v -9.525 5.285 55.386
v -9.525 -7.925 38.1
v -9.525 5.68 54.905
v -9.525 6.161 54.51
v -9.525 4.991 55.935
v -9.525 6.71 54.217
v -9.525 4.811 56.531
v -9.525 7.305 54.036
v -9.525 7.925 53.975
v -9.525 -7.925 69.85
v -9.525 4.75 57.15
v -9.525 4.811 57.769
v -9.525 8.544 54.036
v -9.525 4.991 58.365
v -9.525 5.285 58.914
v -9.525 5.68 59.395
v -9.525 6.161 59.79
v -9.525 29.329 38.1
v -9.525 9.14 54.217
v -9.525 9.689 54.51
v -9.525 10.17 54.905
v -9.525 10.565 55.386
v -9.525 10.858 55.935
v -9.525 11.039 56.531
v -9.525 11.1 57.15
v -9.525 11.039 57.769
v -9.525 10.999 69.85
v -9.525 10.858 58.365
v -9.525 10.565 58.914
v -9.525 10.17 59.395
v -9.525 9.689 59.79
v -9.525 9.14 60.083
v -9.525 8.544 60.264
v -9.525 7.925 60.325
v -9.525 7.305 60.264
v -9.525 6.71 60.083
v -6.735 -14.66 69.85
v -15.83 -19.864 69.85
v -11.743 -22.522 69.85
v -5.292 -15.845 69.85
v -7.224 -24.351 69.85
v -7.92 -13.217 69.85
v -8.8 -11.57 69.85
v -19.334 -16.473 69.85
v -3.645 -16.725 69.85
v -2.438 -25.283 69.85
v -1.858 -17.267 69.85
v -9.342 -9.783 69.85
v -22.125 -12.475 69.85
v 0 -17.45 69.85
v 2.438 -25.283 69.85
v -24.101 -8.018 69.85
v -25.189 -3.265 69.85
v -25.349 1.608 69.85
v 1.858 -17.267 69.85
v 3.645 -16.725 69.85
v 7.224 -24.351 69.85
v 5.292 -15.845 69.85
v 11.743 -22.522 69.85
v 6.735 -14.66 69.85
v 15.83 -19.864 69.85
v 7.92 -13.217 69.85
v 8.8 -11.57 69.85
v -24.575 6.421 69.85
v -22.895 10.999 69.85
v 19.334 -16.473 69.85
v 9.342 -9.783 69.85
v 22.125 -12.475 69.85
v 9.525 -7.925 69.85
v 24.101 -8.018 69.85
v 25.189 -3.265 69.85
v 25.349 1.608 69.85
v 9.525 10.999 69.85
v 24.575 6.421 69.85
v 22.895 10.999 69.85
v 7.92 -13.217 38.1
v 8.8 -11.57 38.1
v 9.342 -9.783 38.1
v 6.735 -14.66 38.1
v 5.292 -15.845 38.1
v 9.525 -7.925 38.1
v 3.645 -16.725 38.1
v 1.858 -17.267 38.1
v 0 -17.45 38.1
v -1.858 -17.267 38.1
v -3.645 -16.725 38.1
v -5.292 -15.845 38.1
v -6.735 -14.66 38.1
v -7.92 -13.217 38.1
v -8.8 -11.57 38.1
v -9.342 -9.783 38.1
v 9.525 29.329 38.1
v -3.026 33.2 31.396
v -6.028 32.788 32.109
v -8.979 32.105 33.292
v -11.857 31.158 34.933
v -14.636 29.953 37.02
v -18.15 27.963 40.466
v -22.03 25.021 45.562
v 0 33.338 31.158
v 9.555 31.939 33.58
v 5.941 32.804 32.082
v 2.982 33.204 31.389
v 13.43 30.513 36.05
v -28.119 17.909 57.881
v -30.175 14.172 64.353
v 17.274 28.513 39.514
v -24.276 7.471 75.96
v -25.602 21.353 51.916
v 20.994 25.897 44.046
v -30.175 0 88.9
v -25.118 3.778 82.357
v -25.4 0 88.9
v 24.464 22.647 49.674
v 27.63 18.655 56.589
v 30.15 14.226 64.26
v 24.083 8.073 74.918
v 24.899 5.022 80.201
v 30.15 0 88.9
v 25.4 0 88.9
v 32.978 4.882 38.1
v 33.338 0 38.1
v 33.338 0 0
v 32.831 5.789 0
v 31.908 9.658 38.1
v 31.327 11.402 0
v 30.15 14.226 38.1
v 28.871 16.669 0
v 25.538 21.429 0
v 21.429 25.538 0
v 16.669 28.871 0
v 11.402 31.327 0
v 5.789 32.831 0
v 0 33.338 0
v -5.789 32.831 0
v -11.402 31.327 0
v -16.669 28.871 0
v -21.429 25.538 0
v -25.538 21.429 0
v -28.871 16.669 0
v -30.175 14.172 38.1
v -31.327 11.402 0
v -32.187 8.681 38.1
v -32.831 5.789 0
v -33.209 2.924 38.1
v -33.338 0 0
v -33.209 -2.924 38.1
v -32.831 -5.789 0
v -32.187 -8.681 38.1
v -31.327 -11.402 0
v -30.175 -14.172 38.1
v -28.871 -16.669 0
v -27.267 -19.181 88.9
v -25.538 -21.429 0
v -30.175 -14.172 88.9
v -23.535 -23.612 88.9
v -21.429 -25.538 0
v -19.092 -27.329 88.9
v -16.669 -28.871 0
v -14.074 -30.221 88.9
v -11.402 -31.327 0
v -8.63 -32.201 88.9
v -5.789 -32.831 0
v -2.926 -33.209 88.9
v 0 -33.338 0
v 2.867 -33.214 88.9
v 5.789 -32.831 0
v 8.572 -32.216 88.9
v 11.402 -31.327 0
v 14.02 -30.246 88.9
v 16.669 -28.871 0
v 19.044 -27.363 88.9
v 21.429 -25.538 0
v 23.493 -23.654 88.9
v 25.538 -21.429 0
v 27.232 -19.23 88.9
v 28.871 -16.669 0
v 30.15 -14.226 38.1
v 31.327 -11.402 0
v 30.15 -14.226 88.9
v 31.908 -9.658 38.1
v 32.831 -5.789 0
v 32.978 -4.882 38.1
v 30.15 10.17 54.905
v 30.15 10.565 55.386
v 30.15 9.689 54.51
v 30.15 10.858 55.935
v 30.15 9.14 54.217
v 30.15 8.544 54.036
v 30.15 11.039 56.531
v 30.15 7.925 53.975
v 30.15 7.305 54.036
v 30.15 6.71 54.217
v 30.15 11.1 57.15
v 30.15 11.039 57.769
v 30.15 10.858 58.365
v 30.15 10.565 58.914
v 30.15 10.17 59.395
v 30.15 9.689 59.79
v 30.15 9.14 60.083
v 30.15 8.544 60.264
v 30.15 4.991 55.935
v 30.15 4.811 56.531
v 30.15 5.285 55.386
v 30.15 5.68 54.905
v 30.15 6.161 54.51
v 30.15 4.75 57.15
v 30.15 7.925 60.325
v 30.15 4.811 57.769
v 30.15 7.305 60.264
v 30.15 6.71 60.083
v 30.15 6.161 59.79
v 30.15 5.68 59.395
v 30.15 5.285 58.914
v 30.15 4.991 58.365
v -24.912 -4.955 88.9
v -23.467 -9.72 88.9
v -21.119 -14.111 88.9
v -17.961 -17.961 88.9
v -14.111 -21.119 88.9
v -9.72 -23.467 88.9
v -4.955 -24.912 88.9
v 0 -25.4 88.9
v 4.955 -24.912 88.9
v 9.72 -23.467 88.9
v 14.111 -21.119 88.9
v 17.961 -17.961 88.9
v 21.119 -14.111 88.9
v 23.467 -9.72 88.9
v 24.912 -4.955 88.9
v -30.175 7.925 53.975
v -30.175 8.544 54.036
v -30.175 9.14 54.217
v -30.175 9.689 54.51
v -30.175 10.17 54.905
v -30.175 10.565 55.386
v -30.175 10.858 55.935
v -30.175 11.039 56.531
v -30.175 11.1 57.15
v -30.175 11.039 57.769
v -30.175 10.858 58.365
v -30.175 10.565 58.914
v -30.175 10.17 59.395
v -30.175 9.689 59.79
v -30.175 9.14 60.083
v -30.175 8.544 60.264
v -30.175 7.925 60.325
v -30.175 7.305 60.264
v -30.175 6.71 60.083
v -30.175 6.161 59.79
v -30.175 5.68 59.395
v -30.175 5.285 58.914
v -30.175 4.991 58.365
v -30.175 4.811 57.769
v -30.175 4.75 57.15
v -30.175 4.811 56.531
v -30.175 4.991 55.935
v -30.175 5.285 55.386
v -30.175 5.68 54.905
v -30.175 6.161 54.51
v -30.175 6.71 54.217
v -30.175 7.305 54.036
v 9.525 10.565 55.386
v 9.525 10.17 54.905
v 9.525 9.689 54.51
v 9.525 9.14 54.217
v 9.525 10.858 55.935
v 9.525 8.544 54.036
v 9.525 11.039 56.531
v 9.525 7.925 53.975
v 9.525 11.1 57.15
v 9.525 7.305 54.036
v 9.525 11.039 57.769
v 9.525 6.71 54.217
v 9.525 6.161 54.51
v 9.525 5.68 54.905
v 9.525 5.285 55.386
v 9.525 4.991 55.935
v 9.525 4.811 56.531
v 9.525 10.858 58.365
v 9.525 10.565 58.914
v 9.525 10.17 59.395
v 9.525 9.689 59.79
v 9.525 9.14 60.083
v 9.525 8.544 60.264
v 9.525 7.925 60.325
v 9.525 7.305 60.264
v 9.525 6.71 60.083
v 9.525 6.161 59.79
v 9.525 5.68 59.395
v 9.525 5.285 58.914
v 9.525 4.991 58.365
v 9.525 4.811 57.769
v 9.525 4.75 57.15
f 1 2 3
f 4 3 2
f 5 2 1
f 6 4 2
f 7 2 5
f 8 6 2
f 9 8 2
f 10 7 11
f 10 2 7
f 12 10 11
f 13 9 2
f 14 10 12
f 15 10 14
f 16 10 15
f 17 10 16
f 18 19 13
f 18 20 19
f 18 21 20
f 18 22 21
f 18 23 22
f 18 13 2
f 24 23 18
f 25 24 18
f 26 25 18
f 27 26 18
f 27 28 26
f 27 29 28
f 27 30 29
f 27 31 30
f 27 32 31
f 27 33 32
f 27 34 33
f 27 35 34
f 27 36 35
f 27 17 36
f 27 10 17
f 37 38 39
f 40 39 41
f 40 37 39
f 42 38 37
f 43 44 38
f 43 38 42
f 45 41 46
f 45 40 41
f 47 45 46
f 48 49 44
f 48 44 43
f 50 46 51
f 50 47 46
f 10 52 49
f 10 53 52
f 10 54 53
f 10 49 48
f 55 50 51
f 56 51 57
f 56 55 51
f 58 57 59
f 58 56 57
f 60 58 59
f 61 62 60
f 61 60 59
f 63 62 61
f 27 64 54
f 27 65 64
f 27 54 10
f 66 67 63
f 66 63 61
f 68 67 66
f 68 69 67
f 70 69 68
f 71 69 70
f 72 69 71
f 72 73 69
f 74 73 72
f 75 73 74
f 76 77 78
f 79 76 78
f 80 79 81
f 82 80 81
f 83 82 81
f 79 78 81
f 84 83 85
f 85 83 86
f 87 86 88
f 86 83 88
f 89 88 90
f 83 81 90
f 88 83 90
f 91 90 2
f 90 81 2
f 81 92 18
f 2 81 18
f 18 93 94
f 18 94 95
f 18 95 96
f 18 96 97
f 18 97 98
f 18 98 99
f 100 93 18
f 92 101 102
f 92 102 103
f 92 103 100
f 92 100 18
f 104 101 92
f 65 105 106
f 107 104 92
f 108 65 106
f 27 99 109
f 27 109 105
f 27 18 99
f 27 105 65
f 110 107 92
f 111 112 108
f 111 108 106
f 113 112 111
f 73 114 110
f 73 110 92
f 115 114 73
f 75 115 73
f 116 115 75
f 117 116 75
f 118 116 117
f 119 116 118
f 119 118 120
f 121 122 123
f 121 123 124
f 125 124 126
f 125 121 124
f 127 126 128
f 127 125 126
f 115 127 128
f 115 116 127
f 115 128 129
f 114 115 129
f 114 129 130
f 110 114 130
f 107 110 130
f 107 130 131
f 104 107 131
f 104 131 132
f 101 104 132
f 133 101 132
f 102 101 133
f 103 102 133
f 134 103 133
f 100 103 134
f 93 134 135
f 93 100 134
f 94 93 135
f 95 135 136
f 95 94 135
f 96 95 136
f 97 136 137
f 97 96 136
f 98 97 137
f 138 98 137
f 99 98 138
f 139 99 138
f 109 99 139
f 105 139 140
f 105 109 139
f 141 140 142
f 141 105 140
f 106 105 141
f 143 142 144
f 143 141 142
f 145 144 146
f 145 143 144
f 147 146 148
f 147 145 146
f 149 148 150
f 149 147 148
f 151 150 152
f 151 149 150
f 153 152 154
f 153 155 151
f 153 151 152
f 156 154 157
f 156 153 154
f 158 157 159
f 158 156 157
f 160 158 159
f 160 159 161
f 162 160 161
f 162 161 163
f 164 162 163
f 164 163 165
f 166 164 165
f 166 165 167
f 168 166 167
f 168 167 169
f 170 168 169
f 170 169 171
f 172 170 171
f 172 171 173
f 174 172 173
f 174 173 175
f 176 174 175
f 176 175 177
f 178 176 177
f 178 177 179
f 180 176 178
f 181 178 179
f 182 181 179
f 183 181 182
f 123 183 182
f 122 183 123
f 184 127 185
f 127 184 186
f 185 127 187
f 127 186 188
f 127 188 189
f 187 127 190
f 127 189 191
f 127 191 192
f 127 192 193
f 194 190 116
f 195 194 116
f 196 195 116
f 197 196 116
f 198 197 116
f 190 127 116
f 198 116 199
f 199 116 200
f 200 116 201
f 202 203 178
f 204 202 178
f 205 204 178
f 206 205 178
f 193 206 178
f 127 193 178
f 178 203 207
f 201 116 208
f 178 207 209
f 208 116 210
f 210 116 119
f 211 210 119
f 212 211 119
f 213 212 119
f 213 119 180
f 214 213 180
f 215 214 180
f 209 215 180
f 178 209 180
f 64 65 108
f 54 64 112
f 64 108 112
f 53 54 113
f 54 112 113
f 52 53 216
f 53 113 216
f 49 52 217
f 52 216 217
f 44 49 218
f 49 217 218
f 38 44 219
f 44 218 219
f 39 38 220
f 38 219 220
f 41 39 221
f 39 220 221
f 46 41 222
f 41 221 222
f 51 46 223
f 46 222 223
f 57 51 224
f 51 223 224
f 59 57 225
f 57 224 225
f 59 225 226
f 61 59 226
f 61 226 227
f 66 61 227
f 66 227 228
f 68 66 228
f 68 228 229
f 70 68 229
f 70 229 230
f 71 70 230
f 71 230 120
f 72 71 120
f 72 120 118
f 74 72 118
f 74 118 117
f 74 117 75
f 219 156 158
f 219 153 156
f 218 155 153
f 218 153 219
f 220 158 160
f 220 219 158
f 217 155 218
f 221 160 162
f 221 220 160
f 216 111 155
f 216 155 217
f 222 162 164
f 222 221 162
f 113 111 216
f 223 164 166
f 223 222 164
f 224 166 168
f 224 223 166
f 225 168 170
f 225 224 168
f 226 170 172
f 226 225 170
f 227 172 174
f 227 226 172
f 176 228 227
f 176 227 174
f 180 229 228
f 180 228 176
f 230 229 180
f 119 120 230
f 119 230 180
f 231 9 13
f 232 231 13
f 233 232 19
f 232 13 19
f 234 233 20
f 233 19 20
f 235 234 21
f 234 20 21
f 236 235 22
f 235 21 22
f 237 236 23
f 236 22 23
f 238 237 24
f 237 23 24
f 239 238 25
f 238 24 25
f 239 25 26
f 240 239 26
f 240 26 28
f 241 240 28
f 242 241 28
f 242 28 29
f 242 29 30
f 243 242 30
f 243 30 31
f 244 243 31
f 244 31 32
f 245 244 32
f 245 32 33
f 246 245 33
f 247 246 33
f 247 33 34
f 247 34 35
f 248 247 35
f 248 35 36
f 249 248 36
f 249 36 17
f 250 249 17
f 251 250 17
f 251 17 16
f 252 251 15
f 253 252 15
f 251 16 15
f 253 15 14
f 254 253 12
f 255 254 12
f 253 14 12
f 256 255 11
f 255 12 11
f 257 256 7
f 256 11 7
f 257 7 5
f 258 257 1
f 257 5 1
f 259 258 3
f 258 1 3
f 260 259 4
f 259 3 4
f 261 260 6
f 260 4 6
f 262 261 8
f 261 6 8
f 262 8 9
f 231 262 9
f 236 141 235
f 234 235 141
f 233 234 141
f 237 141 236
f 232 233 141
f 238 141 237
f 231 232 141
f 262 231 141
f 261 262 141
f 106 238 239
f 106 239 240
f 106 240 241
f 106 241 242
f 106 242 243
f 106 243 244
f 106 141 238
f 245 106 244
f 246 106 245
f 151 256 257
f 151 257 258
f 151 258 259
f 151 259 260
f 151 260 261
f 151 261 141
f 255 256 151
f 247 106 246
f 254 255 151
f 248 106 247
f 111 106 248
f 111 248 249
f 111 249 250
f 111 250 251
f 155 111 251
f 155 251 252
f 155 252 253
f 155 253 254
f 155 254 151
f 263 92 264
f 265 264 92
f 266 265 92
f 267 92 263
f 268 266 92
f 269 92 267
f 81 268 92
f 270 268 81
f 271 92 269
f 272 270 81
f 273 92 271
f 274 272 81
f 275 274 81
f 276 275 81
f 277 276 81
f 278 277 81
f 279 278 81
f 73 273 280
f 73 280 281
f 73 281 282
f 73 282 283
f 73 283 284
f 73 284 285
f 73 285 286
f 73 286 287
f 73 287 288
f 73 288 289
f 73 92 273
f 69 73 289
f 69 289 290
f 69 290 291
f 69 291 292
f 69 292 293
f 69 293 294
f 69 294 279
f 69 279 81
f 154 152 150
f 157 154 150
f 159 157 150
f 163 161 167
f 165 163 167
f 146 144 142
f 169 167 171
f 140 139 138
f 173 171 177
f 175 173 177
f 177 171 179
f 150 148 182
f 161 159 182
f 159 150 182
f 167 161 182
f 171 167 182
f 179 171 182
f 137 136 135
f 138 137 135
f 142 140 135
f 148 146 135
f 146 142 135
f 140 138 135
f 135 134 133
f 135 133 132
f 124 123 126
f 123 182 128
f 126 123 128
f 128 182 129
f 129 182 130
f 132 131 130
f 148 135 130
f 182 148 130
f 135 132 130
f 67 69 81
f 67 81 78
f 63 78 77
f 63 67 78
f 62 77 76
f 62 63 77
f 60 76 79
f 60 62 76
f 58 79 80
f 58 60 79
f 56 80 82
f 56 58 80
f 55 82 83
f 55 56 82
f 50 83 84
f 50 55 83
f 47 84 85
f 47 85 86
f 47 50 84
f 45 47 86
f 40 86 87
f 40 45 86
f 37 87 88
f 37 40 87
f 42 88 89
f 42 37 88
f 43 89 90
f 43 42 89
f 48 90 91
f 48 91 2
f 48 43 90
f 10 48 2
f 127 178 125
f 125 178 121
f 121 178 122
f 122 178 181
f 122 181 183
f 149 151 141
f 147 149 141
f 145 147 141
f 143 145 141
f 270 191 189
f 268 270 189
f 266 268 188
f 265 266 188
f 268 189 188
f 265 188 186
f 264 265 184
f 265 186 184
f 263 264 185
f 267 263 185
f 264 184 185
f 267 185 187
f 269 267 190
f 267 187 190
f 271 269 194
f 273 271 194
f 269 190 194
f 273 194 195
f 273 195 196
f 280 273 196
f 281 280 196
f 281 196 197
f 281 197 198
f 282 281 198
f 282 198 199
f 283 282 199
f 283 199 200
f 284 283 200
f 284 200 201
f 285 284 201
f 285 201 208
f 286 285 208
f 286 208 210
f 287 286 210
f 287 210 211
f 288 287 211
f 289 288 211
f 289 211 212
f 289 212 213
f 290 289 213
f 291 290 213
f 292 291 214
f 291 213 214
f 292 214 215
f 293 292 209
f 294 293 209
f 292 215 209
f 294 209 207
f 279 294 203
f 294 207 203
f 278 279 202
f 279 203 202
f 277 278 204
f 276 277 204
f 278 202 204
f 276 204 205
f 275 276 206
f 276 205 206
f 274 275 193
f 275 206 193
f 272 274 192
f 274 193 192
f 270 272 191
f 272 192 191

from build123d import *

# Parameters (mm, degrees)
CROQUIS2_W              = 66.675
CROQUIS2_H              = 66.675
SALIENTE_EXTRUIR2_DEPTH = 88.9
CORTAR_EXTRUIR1_DEPTH   = 117.01790608
CROQUIS4_R              = 25.4
CORTAR_EXTRUIR2_DEPTH   = 19.05
CORTAR_EXTRUIR3_DEPTH   = 31.75
CROQUIS6_OUTSIDE_W      = 94.593
CROQUIS6_OUTSIDE_H      = 94.593
CROQUIS6_OUTSIDE_R      = 33.3375
CORTAR_EXTRUIR5_DEPTH   = 101.627967348
CORTAR_EXTRUIR6_DEPTH   = 50.8
CROQUIS9_R              = 3.175
CORTAR_EXTRUIR7_DEPTH   = 60.325


with BuildPart() as part:
    # Croquis2 → Saliente-Extruir2 (new body)
    with BuildSketch(Plane.XY):
        Rectangle(CROQUIS2_W, CROQUIS2_H)
    extrude(amount=SALIENTE_EXTRUIR2_DEPTH)

    # Croquis3 → Cortar-Extruir1 (cut, through all)
    with BuildSketch(Plane(origin=(33.3375, 0, 0), x_dir=(0, 0, -1), z_dir=(1, 0, 0))):
        Polygon((-88.9, 0), (-88.9, 33.3375), (-31.157756203, 33.3375), align=None)
    extrude(amount=-CORTAR_EXTRUIR1_DEPTH, mode=Mode.SUBTRACT)

    # Croquis4 → Cortar-Extruir2 (cut)
    with BuildSketch(Plane.XY.offset(88.9)):
        Circle(CROQUIS4_R)
    extrude(amount=-CORTAR_EXTRUIR2_DEPTH, mode=Mode.SUBTRACT)

    # Croquis5 → Cortar-Extruir3 (cut)
    with BuildSketch(Plane.XY.offset(69.85)):
        with BuildLine():
            Line((-9.525, -7.9248), (-9.525, 33.3375))
            Line((-9.525, 33.3375), (9.525, 33.3375))
            Line((9.525, 33.3375), (9.525, -7.9248))
            ThreePointArc((9.525, -7.9248), (0, -17.4498), (-9.525, -7.9248))
        make_face()
    extrude(amount=-CORTAR_EXTRUIR3_DEPTH, mode=Mode.SUBTRACT)

    # Croquis6 outside → Cortar-Extruir5 (cut, through all)
    with BuildSketch(Plane.XY.offset(88.9)):
        with Locations((0.0005, 0.0005)):
            Rectangle(CROQUIS6_OUTSIDE_W, CROQUIS6_OUTSIDE_H)
        Circle(CROQUIS6_OUTSIDE_R, mode=Mode.SUBTRACT)
    extrude(amount=-CORTAR_EXTRUIR5_DEPTH, mode=Mode.SUBTRACT)

    # Croquis8 → Cortar-Extruir6 (cut)
    with BuildSketch(Plane.XY.offset(88.9)):
        with BuildLine():
            Line((-30.1752, 14.172022128), (-30.1752, -14.172022128))
            ThreePointArc((-30.1752, -14.172022128), (-33.3375, 0), (-30.1752, 14.172022128))
        make_face()
        with BuildLine():
            Line((30.1498, 14.225978568), (30.1498, -14.225978568))
            ThreePointArc((30.1498, -14.225978568), (33.3375, 0), (30.1498, 14.225978568))
        make_face()
    extrude(amount=-CORTAR_EXTRUIR6_DEPTH, mode=Mode.SUBTRACT)

    # Croquis9 → Cortar-Extruir7 (cut)
    with BuildSketch(Plane(origin=(30.1498, 0, 0), x_dir=(0, 0, -1), z_dir=(1, 0, 0))):
        with Locations((-57.15, 7.9248)):
            Circle(CROQUIS9_R)
    extrude(amount=-CORTAR_EXTRUIR7_DEPTH, mode=Mode.SUBTRACT)


solid = part.part
